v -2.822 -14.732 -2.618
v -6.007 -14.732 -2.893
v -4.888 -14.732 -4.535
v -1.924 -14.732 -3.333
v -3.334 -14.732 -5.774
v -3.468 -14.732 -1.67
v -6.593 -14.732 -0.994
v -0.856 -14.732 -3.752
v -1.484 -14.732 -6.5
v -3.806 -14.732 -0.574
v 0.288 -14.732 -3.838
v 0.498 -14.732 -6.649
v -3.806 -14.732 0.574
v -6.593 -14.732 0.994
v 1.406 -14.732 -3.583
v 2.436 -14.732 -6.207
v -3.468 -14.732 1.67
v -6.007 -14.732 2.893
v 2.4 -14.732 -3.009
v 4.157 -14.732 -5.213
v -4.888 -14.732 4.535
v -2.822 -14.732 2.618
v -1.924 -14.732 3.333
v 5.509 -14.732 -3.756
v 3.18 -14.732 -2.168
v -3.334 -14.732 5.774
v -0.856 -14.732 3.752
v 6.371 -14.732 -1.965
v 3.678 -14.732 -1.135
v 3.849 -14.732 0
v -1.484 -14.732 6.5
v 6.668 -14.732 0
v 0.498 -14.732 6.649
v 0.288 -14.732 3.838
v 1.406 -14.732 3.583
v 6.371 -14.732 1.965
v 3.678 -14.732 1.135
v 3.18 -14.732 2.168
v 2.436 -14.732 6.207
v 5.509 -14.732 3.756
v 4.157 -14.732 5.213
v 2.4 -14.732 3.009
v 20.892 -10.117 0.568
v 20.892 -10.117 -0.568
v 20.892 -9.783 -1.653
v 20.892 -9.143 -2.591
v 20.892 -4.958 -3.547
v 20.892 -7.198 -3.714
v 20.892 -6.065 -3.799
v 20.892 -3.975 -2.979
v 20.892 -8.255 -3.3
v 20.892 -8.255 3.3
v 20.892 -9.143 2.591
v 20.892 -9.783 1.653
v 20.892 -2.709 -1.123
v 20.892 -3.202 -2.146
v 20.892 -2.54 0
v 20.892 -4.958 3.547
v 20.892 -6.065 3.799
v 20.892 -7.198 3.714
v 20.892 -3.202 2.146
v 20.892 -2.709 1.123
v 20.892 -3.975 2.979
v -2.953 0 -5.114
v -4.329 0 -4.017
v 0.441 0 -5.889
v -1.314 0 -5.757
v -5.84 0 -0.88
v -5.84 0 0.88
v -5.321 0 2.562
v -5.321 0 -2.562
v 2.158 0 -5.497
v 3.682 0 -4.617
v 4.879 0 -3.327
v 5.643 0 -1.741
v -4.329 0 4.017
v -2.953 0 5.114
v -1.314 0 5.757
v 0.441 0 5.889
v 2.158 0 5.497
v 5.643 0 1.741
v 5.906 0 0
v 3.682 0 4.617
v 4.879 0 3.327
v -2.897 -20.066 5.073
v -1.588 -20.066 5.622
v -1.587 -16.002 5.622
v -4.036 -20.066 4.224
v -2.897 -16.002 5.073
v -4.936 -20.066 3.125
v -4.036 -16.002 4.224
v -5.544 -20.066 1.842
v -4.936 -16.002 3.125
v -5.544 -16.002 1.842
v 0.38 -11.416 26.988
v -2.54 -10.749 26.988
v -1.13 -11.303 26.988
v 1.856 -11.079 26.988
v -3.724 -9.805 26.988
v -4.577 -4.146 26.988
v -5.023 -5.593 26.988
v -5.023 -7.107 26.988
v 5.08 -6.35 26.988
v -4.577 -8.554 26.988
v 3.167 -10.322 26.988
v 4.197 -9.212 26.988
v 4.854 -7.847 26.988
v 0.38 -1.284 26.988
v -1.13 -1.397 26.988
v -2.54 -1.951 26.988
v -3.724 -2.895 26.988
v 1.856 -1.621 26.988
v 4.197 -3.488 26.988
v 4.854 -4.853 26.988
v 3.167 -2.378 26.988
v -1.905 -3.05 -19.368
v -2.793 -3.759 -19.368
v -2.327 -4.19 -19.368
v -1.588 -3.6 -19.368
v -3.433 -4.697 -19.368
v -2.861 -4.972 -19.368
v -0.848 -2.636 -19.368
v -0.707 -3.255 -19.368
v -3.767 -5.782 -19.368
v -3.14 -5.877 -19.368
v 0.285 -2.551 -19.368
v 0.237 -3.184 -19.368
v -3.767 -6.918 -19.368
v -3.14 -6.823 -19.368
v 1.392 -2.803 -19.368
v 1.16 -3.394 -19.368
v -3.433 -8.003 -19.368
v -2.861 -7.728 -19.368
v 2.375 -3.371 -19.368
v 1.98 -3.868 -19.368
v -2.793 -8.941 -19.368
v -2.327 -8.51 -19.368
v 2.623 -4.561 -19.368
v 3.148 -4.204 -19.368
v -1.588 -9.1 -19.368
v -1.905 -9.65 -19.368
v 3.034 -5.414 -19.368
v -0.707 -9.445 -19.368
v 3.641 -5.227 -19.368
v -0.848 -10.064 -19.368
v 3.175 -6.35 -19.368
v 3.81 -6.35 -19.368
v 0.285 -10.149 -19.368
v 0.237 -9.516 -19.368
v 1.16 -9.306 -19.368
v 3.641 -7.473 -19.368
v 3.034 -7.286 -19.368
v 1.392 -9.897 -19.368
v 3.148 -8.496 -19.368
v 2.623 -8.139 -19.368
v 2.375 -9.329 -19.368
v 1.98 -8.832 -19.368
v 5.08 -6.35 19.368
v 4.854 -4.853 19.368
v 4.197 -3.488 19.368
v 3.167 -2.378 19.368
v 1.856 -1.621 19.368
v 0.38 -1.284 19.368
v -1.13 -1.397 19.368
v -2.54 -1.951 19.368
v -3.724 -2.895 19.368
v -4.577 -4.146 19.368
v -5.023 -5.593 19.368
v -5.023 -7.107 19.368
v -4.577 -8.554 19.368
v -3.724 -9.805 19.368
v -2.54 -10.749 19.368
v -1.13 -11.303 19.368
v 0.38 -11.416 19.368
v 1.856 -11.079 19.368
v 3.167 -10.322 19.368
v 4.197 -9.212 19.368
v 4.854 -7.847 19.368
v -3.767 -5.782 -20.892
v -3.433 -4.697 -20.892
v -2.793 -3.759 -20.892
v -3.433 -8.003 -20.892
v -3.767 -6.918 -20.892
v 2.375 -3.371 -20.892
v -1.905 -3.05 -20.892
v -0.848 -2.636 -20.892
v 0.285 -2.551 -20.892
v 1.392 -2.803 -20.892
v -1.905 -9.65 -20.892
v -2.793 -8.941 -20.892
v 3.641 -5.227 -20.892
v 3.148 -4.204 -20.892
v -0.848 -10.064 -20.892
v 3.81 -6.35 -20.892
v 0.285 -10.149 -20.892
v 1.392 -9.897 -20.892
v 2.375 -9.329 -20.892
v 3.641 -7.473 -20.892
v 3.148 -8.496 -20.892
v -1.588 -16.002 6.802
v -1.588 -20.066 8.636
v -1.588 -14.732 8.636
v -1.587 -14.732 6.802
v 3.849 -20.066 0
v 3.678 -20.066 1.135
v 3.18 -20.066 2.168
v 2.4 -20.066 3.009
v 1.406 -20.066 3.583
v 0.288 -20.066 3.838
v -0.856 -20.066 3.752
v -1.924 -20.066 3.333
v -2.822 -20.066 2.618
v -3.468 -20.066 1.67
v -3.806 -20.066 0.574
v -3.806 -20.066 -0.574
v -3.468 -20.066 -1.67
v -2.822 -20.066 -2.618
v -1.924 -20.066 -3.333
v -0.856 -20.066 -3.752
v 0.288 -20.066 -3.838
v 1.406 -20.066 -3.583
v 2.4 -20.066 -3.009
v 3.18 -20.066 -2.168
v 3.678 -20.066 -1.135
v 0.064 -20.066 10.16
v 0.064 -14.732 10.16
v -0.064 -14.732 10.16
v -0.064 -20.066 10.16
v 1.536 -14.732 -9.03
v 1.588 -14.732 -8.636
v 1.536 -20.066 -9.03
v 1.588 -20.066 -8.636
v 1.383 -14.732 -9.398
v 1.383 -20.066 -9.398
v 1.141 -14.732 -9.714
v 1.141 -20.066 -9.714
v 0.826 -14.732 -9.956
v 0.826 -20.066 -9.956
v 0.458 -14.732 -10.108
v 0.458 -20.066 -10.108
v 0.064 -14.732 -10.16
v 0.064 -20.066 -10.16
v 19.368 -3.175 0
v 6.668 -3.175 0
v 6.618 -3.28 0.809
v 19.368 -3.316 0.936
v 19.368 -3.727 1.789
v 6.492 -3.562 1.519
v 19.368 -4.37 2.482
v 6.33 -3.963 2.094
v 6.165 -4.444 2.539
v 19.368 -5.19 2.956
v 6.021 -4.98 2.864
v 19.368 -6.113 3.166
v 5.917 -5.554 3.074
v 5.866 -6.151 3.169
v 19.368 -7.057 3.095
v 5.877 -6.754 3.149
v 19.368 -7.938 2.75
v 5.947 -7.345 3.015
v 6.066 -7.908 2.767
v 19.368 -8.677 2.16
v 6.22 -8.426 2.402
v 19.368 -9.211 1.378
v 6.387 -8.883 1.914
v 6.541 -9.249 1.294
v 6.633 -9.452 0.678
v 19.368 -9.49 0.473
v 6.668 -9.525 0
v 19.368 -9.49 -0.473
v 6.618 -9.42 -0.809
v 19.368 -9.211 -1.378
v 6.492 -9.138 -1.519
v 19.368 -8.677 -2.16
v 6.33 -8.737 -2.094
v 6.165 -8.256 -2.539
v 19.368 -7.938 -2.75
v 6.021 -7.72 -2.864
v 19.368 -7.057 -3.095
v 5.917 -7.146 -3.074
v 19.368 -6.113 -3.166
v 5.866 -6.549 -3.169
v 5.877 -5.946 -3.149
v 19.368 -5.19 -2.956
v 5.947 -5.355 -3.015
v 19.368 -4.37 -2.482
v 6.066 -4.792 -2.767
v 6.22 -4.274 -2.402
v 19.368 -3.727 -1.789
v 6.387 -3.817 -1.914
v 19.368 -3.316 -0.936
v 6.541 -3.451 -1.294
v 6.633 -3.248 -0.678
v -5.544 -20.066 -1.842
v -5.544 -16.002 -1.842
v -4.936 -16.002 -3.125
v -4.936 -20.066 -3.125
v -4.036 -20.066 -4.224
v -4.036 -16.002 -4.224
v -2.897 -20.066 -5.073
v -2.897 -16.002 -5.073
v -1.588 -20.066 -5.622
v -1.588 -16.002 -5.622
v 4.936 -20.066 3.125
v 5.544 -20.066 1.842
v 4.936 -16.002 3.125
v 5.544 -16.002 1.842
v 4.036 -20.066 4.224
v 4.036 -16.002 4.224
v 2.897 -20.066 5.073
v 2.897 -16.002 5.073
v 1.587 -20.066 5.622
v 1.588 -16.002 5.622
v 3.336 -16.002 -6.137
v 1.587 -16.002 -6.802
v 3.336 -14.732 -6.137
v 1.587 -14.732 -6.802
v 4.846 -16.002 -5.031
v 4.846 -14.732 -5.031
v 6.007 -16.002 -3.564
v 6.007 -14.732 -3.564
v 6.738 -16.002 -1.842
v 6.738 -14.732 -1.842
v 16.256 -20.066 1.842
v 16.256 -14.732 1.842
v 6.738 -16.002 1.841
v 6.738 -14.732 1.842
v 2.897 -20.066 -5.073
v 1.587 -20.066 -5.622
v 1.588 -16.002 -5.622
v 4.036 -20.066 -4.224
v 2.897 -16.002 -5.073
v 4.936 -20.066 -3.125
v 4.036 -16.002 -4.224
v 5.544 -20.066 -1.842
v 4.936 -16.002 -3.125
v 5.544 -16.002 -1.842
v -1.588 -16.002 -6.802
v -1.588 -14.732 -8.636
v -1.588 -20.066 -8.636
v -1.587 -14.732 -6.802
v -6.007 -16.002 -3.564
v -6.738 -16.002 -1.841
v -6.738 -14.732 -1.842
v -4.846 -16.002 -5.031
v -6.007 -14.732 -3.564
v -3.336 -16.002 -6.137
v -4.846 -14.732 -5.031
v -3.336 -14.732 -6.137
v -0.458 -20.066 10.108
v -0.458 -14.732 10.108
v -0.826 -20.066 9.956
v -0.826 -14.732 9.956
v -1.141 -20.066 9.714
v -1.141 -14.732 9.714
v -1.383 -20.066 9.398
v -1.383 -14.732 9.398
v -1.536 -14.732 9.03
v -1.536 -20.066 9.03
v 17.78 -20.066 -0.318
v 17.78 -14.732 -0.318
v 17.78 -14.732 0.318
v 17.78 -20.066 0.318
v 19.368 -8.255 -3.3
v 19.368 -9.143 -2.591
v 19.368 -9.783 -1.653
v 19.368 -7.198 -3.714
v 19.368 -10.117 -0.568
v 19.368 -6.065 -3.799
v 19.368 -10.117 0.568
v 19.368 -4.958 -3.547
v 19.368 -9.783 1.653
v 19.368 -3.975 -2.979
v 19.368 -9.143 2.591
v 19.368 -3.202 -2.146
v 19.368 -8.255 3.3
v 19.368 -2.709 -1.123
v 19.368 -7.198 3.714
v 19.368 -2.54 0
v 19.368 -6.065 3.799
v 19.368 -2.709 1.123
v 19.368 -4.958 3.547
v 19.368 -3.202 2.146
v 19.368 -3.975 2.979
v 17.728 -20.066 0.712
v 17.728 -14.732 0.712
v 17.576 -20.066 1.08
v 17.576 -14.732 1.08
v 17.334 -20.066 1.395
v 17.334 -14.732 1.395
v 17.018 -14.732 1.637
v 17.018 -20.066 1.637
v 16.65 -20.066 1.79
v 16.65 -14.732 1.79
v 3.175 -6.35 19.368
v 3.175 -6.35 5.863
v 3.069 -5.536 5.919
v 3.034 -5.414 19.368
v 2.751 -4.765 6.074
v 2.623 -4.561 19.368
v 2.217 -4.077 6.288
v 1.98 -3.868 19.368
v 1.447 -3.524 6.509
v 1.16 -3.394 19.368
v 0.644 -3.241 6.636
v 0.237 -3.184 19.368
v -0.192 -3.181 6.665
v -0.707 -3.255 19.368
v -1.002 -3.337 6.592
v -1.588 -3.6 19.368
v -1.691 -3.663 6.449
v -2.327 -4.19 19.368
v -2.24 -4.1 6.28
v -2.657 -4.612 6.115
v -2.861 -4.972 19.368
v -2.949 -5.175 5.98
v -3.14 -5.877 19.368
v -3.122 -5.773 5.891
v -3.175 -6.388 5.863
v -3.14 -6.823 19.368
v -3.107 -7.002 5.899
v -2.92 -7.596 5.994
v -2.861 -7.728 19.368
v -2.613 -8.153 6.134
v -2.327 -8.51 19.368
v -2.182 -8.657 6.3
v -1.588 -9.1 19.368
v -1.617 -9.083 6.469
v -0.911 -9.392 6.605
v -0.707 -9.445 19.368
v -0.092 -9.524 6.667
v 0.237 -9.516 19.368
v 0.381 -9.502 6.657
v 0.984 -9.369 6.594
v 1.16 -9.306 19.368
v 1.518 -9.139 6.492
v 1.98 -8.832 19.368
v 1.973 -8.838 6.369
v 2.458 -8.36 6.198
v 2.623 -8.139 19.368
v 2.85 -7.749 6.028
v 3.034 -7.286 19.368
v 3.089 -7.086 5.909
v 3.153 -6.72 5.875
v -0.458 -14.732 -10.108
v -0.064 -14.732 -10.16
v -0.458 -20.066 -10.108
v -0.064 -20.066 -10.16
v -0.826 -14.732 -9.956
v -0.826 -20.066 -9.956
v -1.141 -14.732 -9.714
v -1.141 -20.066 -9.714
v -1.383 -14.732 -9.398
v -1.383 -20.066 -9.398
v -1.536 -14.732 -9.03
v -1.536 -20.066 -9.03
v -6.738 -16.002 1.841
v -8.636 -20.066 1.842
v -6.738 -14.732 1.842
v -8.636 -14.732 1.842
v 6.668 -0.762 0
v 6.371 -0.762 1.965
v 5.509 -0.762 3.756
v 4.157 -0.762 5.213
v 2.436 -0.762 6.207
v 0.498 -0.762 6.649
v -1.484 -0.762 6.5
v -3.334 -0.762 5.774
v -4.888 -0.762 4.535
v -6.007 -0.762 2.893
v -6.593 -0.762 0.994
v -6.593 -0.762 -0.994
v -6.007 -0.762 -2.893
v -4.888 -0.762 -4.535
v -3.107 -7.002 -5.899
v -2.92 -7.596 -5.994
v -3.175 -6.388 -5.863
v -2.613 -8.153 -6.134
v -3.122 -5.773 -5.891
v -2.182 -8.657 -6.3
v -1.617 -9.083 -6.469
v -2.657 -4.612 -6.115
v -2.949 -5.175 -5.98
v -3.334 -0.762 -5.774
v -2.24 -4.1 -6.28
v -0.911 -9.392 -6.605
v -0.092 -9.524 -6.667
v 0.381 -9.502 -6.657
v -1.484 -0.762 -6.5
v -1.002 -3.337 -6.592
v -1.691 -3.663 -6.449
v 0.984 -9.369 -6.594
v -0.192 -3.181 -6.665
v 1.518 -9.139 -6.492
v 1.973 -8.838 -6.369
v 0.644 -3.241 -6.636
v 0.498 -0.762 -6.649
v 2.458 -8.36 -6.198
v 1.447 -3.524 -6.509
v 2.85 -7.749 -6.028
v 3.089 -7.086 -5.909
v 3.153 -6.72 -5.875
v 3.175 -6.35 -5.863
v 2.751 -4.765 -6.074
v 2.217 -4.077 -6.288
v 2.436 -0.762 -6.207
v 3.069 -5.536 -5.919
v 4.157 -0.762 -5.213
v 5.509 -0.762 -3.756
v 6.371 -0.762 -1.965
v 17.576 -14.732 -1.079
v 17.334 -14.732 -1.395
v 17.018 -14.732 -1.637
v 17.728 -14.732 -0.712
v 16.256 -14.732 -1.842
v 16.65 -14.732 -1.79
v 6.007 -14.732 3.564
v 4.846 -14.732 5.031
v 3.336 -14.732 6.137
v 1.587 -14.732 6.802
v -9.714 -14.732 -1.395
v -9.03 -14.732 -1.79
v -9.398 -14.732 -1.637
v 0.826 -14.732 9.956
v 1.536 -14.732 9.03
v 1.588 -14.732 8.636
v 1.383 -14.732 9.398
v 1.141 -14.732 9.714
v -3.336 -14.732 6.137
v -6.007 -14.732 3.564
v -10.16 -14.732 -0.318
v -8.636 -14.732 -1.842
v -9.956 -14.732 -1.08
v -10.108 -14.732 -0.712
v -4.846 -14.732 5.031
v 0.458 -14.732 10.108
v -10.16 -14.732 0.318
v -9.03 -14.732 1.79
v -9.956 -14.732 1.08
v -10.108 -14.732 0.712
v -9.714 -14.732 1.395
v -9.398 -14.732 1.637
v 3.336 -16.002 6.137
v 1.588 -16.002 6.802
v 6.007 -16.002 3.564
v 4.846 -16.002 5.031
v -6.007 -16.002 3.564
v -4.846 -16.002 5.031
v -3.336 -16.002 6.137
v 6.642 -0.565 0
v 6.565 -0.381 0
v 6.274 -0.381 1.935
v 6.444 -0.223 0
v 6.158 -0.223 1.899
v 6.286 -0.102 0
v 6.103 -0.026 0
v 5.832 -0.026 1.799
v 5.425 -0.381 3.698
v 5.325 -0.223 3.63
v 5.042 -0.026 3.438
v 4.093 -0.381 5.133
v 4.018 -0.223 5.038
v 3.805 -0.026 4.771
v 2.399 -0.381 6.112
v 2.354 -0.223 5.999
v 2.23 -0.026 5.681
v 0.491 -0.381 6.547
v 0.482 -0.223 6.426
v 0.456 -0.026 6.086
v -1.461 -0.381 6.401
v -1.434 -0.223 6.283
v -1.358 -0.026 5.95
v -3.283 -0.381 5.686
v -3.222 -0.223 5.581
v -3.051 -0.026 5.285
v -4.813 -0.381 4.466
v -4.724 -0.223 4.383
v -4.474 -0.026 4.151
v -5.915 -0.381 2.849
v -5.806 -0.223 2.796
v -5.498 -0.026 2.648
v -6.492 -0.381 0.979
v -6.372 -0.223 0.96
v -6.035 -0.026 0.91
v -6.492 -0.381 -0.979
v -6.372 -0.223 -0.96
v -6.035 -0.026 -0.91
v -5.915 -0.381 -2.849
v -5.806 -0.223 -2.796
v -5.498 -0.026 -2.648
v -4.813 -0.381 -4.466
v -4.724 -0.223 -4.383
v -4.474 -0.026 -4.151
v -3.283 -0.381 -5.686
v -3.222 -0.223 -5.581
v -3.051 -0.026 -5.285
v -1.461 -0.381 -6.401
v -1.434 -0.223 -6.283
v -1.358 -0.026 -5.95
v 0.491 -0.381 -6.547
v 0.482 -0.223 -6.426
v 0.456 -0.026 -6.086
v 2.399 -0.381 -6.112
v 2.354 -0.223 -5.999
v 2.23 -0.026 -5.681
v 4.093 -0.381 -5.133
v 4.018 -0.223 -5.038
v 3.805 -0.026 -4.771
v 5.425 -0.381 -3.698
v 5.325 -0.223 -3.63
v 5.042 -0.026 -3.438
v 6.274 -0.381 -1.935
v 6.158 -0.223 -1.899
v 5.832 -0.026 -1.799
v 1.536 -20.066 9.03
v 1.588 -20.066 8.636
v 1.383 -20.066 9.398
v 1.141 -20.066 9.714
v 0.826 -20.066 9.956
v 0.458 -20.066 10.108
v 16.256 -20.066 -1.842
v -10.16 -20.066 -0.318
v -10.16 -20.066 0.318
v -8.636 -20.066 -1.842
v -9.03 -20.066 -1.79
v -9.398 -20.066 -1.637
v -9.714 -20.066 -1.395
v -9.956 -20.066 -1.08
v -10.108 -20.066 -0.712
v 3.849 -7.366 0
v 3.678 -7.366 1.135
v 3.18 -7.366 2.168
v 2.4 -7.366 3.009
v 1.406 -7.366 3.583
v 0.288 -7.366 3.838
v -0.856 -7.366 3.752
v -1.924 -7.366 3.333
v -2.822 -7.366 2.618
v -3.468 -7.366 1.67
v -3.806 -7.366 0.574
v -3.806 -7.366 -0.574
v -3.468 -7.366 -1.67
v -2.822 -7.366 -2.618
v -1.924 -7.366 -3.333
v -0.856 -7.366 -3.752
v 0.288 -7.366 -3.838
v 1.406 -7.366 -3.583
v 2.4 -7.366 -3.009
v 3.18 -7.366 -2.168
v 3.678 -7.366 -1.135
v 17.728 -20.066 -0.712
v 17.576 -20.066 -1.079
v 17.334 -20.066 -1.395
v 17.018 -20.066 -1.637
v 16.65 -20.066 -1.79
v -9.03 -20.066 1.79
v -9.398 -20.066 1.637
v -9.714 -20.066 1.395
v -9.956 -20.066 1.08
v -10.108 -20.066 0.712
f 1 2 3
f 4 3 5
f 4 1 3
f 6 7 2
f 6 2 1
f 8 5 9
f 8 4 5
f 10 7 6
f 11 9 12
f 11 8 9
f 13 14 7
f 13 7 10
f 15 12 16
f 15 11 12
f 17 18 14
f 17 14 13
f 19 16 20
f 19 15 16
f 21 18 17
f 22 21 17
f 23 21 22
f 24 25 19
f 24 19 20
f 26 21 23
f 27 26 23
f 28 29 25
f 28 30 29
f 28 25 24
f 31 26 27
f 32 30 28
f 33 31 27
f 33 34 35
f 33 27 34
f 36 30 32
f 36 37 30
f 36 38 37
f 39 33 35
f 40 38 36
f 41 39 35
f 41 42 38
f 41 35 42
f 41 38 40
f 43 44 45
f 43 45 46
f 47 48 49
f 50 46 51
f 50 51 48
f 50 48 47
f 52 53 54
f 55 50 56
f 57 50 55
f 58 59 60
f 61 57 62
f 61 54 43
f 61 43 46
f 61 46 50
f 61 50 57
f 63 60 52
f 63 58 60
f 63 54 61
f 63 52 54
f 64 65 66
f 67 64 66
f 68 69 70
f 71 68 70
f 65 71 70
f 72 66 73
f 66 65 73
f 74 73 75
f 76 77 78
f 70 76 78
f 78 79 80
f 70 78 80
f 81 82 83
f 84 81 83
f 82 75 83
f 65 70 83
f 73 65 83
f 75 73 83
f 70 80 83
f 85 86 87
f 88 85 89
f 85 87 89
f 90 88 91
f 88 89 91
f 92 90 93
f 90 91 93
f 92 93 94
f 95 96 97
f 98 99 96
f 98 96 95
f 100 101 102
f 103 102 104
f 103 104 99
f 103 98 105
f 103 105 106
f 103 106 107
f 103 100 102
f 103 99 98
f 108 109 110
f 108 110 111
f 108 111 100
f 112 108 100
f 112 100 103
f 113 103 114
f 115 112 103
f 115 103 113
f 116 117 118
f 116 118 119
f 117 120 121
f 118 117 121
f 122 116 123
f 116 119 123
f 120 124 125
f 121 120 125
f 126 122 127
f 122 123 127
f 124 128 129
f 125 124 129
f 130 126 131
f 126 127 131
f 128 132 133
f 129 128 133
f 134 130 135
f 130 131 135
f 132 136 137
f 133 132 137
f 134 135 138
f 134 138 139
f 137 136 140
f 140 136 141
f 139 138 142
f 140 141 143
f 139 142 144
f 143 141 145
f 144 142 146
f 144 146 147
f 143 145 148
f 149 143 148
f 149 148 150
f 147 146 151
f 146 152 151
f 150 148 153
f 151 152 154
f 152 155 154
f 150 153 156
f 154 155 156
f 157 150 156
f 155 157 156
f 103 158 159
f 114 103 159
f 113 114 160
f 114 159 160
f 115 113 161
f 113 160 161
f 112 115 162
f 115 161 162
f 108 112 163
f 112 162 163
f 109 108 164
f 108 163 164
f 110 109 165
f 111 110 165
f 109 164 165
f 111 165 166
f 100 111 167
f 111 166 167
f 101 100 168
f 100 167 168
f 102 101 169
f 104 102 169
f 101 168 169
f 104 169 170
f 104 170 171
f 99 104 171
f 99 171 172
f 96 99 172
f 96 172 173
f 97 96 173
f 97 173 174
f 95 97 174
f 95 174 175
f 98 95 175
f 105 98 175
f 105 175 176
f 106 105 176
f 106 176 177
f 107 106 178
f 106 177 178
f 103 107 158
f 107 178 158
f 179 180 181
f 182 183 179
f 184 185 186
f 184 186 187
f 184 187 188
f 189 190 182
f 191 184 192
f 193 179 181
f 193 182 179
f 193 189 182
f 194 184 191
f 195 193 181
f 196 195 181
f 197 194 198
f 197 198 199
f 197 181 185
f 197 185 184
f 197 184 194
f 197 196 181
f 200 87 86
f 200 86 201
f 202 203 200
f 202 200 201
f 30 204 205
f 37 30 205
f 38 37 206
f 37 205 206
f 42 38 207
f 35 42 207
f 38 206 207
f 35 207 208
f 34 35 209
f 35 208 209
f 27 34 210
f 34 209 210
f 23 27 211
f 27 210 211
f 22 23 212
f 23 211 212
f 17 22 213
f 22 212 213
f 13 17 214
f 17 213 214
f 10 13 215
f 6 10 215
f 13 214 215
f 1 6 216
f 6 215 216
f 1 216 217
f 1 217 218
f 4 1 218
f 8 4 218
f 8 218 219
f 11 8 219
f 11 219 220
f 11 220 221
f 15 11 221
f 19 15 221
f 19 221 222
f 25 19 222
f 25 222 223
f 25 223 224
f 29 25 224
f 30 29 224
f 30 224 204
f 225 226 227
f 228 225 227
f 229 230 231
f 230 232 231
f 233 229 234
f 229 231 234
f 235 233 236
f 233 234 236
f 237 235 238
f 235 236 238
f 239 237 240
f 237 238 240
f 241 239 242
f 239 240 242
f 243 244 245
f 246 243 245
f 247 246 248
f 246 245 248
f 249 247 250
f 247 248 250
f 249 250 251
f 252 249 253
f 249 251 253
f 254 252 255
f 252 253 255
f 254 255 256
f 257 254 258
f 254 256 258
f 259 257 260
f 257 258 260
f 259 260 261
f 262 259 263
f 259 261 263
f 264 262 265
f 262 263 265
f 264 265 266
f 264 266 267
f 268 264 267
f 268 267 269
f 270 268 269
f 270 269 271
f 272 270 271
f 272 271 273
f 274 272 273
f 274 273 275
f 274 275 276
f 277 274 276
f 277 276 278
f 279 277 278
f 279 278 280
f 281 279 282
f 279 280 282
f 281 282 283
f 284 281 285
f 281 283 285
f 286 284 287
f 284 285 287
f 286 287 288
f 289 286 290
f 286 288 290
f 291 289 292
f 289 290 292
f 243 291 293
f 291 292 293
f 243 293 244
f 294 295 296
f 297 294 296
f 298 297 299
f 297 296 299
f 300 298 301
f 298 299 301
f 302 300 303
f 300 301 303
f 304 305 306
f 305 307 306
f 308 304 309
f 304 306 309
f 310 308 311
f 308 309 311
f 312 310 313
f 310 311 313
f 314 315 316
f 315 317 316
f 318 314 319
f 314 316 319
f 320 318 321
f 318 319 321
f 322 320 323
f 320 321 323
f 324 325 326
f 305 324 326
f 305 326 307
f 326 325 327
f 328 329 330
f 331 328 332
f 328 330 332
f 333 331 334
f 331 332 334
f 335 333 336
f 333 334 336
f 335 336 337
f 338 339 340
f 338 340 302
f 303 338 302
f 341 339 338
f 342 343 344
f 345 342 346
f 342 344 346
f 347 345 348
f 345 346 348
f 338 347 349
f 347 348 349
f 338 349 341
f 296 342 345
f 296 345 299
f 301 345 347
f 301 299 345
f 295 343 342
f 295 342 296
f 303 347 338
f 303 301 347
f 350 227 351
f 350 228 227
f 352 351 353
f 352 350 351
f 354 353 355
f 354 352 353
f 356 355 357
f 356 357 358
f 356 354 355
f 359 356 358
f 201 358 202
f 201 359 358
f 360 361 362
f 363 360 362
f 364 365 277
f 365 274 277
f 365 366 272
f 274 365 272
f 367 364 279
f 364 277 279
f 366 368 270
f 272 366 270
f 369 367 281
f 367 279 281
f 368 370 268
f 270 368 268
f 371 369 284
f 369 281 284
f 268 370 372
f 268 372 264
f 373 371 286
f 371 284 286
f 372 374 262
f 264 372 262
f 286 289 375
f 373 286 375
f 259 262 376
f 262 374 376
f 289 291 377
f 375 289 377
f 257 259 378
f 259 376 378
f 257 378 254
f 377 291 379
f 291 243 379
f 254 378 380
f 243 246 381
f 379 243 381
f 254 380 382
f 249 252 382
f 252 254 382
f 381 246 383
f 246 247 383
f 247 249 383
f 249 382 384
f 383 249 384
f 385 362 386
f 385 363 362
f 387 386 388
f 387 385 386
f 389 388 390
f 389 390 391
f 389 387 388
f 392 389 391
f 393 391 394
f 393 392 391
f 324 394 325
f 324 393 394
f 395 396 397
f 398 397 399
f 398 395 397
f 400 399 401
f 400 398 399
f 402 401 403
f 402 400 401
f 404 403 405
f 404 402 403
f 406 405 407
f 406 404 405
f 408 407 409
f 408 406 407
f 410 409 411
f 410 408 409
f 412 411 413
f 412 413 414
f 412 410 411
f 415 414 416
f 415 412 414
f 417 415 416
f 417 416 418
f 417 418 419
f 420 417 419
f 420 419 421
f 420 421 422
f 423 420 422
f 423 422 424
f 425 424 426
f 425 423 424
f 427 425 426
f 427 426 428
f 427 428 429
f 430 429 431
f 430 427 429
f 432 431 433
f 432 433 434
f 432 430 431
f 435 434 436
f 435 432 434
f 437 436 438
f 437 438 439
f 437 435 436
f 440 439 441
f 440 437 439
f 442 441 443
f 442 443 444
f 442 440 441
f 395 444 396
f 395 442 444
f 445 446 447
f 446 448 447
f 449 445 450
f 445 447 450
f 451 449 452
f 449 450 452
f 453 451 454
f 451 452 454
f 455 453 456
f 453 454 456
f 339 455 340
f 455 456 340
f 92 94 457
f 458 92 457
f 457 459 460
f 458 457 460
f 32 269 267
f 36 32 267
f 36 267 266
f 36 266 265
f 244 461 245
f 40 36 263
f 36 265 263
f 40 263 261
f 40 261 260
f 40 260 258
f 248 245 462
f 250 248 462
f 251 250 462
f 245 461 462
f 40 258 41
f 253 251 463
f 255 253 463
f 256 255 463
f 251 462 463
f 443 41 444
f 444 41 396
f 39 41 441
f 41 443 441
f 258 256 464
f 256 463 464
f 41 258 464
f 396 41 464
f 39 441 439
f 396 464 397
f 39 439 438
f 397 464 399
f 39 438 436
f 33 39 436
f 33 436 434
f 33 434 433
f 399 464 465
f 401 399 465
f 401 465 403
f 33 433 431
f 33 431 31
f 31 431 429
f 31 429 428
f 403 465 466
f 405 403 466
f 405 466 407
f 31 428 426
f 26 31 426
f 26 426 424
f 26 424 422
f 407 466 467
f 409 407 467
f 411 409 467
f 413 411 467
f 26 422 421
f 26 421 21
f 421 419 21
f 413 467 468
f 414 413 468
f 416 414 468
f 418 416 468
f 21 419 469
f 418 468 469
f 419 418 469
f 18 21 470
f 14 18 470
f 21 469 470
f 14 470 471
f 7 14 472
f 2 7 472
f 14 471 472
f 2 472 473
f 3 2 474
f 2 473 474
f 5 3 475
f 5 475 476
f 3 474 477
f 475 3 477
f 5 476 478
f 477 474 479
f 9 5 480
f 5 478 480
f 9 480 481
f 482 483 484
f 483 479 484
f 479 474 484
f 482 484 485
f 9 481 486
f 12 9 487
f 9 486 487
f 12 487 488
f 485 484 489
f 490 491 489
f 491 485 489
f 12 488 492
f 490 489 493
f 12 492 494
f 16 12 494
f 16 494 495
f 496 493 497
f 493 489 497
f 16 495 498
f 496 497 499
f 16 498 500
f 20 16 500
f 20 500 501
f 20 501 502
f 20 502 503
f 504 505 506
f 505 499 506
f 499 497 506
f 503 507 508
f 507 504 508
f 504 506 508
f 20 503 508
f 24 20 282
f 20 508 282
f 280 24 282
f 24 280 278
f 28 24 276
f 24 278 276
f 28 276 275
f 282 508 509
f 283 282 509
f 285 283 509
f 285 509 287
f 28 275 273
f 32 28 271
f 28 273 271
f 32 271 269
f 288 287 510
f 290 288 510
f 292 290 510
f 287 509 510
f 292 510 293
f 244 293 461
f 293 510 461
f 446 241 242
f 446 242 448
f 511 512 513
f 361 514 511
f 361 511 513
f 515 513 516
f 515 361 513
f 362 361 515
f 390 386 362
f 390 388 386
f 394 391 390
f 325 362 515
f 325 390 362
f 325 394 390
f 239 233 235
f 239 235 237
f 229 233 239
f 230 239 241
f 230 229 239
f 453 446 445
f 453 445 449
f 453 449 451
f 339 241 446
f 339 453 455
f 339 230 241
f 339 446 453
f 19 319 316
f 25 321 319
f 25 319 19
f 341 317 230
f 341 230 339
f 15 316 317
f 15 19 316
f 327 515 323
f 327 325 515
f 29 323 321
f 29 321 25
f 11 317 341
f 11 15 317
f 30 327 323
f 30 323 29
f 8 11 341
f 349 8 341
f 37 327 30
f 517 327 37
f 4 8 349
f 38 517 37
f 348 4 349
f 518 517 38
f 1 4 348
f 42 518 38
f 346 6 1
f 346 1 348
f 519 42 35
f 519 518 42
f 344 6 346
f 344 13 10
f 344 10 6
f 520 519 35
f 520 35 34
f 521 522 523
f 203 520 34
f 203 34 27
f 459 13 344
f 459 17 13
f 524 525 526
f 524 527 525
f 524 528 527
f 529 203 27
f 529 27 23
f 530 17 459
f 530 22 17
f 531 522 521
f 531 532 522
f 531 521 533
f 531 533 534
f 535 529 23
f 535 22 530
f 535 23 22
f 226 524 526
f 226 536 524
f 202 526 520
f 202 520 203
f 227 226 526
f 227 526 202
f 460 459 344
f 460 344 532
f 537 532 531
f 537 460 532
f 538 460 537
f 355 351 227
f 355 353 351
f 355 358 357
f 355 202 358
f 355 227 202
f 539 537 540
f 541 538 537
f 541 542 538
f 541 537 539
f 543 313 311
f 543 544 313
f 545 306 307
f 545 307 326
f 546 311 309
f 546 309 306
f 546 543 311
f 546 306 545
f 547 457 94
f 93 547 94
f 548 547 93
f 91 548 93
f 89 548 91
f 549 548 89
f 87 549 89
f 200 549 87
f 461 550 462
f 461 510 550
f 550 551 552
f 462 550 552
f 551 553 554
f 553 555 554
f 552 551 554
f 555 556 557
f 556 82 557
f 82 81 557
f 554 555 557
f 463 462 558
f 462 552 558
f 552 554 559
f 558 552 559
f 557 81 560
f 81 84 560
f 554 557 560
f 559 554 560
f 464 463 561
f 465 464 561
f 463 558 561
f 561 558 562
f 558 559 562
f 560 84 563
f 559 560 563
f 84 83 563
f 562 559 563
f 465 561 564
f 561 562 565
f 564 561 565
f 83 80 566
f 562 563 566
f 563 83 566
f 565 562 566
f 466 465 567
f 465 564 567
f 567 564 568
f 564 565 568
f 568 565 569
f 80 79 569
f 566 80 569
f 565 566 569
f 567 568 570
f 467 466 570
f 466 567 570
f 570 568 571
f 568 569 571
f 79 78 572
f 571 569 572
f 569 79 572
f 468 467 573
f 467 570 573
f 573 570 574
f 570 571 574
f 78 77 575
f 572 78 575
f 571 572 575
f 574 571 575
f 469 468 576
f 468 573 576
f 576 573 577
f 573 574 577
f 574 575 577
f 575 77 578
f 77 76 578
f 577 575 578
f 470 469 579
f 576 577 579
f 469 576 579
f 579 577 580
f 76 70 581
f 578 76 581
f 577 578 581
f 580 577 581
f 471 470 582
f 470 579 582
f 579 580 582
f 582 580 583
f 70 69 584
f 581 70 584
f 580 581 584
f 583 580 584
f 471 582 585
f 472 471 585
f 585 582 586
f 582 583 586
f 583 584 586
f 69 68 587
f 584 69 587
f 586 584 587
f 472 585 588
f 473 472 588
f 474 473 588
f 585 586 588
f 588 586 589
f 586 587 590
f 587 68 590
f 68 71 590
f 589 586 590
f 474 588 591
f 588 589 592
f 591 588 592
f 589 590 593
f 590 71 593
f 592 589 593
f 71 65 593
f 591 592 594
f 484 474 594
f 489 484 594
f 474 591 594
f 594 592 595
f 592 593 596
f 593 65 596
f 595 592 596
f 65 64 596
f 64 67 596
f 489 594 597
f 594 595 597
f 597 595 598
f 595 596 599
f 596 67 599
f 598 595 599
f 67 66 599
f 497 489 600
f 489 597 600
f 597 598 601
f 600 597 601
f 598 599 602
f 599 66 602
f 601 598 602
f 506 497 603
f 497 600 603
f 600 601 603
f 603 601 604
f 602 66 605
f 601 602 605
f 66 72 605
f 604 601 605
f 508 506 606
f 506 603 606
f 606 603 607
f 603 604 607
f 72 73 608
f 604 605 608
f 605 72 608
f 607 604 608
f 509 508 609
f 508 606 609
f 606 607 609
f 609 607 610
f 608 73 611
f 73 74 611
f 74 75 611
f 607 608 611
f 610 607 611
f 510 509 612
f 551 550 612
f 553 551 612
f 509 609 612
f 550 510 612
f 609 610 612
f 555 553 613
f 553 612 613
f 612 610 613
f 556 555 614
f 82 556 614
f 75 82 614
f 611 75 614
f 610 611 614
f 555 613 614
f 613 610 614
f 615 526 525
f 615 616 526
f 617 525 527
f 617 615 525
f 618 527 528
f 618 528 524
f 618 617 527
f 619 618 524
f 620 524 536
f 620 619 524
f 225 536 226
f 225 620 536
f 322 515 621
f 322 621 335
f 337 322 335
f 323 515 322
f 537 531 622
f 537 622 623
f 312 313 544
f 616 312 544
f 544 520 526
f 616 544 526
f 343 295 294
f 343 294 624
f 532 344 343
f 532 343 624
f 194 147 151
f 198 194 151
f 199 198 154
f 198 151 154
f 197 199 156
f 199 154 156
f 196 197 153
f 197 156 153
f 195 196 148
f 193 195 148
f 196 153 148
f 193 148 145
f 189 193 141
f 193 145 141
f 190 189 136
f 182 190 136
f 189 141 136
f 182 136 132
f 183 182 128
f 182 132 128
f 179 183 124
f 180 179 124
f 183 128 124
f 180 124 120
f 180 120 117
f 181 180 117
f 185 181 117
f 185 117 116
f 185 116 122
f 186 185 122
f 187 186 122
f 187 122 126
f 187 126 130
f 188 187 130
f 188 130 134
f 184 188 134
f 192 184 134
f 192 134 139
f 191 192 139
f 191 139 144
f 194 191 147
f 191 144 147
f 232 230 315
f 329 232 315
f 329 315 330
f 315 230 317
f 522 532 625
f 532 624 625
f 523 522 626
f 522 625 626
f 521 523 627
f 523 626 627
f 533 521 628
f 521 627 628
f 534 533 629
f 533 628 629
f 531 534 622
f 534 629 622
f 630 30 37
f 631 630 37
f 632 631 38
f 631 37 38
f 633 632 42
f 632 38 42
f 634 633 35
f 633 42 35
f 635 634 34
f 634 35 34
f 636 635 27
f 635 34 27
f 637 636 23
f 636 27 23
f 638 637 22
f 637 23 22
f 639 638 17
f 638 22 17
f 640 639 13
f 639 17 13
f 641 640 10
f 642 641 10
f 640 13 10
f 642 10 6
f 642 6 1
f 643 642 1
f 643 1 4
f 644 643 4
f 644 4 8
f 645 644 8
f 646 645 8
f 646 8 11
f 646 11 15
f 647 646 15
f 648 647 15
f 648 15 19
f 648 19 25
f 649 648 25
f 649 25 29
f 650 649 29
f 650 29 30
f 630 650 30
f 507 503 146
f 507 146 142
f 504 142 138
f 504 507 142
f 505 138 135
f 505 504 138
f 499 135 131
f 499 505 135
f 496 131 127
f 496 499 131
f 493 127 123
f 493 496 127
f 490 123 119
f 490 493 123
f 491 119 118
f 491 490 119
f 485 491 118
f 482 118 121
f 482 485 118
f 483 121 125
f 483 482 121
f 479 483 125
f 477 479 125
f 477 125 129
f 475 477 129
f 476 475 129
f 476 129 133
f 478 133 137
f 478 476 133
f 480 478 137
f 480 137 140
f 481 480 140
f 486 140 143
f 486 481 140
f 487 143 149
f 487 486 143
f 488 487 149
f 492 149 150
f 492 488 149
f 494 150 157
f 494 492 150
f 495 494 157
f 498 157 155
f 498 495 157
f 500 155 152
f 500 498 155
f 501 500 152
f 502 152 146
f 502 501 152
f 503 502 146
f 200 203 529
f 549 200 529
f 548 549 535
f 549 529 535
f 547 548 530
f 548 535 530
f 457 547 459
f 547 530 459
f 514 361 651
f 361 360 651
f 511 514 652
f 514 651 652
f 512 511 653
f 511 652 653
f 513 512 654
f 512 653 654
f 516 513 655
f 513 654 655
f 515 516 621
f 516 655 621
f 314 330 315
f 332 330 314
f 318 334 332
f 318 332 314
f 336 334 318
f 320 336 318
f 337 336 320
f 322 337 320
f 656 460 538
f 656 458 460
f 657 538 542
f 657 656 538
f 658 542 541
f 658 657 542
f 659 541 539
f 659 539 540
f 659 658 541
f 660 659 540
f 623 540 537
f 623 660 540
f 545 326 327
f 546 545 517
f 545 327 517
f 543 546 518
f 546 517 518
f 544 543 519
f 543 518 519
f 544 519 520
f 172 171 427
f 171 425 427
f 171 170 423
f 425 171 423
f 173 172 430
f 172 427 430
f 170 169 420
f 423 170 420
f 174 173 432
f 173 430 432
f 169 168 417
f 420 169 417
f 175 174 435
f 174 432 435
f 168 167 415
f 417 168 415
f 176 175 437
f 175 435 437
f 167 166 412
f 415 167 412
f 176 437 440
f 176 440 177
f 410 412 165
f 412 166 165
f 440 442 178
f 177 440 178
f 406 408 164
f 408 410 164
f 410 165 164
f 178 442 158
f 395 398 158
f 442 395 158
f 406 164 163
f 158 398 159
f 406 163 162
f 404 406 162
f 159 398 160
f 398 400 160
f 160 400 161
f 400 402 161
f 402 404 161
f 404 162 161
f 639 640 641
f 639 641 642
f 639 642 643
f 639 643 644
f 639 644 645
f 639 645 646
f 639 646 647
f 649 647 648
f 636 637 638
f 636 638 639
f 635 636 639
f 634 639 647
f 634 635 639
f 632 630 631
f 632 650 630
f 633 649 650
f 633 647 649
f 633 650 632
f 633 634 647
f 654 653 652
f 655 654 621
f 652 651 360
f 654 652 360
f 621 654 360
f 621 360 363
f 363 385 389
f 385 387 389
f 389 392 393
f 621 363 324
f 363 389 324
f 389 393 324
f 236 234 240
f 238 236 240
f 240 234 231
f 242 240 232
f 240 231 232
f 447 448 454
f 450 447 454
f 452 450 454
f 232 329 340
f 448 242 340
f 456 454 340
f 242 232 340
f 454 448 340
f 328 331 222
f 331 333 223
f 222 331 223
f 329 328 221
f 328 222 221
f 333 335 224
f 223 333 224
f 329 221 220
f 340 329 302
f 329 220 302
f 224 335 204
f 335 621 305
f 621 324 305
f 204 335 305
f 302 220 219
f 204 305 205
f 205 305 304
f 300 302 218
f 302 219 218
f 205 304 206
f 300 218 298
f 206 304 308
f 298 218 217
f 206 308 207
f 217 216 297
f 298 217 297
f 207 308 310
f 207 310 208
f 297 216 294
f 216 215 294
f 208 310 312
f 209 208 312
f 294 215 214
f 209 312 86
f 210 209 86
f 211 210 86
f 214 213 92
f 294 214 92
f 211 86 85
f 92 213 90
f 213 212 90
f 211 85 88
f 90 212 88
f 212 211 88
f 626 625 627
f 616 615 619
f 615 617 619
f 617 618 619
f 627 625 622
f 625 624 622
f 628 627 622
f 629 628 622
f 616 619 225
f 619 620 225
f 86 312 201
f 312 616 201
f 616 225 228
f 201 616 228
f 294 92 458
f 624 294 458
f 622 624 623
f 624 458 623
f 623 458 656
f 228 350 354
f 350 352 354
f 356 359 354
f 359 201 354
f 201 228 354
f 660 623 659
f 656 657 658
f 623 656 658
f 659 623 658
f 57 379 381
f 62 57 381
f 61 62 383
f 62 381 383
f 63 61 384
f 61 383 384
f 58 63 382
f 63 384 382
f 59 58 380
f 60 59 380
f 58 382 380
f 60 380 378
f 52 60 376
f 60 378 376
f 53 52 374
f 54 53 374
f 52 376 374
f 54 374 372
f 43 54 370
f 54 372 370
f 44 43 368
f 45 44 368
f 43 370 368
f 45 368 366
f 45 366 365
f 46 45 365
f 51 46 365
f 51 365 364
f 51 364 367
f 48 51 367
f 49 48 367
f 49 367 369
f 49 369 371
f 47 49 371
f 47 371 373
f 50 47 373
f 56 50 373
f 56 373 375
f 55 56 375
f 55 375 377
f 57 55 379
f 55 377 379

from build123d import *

# Parameters (mm, degrees)
F0_R      = 6.6675
F1_DEPTH  = 14.732
F2_R      = 3.175
F3_DEPTH  = 19.3675
F4_R      = 3.175
F5_DEPTH  = 19.3675
F6_R      = 0.762
F7_R      = 5.08
F8_DEPTH  = 7.62
F9_R      = 3.81
F10_DEPTH = 1.524
F11_R     = 3.81
F12_DEPTH = 1.524
F13_R     = 6.985
F14_DEPTH = 1.27
F15_R     = 5.842
F15_R_2   = 3.81
F16_DEPTH = 4.064
F17_W     = 3.175
F17_H     = 20.32
F18_DEPTH = 5.334
F19_W     = 27.94
F19_H     = 3.683
F20_DEPTH = 5.334
F21_R     = 3.8489929185
F22_DEPTH = 12.7
F23_R     = 1.524


with BuildPart() as f1:
    # F0 (on Front) → F1 (new body)
    with BuildSketch(Plane.XZ):
        Circle(F0_R)
    extrude(amount=F1_DEPTH)

    # F2 (on Top) → F3 (join, symmetric)
    with BuildSketch(Plane.XY):
        with Locations((0, -6.35)):
            Circle(F2_R)
    extrude(amount=F3_DEPTH, both=True)

    # F4 (on Right) → F5 (join)
    with BuildSketch(Plane.YZ):
        with Locations((-6.35, 0)):
            Circle(F4_R)
    extrude(amount=F5_DEPTH)

    # F6
    f6_edges = [f1.edges().sort_by_distance(p)[0] for p in [
        (-6.6675, 0, 0),
    ]]
    fillet(f6_edges, radius=F6_R)

    # F7 (on face) → F8 (join)
    with BuildSketch(Plane.XY.offset(19.3675)):
        with Locations((0, -6.35)):
            Circle(F7_R)
    extrude(amount=F8_DEPTH)

    # F9 (on face) → F10 (join)
    with BuildSketch(Plane.YZ.offset(19.3675)):
        with Locations((-6.35, 0)):
            Circle(F9_R)
    extrude(amount=F10_DEPTH)

    # F11 (on face) → F12 (join)
    with BuildSketch(Plane(origin=(0, 0, -19.3675), x_dir=(1, 0, 0), z_dir=(0, 0, -1))):
        with Locations((0, 6.35)):
            Circle(F11_R)
    extrude(amount=F12_DEPTH)


with BuildPart() as f14:
    # F13 (on face) → F14 (new body)
    with BuildSketch(Plane.XZ.offset(14.732)):
        Circle(F13_R)
    extrude(amount=F14_DEPTH)

    # F15 (on face) → F16 (join)
    with BuildSketch(Plane.XZ.offset(16.002)):
        Circle(F15_R)
        Circle(F15_R_2, mode=Mode.SUBTRACT)
    extrude(amount=F16_DEPTH)

    # F17 (on face) → F18 (join, through all)
    with BuildSketch(Plane(origin=(0, -14.732, 0), x_dir=(-1, 0, 0), z_dir=(0, 1, 0))):
        Rectangle(F17_W, F17_H)
    extrude(amount=-F18_DEPTH)

    # F19 (on face) → F20 (join, through all)
    with BuildSketch(Plane(origin=(0, -14.732, 0), x_dir=(-1, 0, 0), z_dir=(0, 1, 0))):
        with Locations((-3.81, 0)):
            Rectangle(F19_W, F19_H)
    extrude(amount=-F20_DEPTH)


with BuildPart() as f22_tool:
    # F21 (on face) → F22 (new body)
    with BuildSketch(Plane.XZ.offset(20.066)):
        Circle(F21_R)
    extrude(amount=-F22_DEPTH)


with BuildPart() as f1_1:
    add(f1.part)

    # F22: cut by f22_tool
    add(f22_tool.part, mode=Mode.SUBTRACT)


with BuildPart() as f14_1:
    add(f14.part)

    # F22: cut by f22_tool
    add(f22_tool.part, mode=Mode.SUBTRACT)

    # F23
    f23_edges = [f14_1.edges().sort_by_distance(p)[0] for p in [
        (17.78, -17.399, -1.8415),
        (17.78, -17.399, 1.8415),
        (1.5875, -17.399, 10.16),
        (-1.5875, -17.399, 10.16),
        (-10.16, -17.399, 1.8415),
        (-10.16, -17.399, -1.8415),
        (-1.5875, -17.399, -10.16),
        (1.5875, -17.399, -10.16),
    ]]
    fillet(f23_edges, radius=F23_R)


solid = Compound([f1_1.part, f14_1.part])
